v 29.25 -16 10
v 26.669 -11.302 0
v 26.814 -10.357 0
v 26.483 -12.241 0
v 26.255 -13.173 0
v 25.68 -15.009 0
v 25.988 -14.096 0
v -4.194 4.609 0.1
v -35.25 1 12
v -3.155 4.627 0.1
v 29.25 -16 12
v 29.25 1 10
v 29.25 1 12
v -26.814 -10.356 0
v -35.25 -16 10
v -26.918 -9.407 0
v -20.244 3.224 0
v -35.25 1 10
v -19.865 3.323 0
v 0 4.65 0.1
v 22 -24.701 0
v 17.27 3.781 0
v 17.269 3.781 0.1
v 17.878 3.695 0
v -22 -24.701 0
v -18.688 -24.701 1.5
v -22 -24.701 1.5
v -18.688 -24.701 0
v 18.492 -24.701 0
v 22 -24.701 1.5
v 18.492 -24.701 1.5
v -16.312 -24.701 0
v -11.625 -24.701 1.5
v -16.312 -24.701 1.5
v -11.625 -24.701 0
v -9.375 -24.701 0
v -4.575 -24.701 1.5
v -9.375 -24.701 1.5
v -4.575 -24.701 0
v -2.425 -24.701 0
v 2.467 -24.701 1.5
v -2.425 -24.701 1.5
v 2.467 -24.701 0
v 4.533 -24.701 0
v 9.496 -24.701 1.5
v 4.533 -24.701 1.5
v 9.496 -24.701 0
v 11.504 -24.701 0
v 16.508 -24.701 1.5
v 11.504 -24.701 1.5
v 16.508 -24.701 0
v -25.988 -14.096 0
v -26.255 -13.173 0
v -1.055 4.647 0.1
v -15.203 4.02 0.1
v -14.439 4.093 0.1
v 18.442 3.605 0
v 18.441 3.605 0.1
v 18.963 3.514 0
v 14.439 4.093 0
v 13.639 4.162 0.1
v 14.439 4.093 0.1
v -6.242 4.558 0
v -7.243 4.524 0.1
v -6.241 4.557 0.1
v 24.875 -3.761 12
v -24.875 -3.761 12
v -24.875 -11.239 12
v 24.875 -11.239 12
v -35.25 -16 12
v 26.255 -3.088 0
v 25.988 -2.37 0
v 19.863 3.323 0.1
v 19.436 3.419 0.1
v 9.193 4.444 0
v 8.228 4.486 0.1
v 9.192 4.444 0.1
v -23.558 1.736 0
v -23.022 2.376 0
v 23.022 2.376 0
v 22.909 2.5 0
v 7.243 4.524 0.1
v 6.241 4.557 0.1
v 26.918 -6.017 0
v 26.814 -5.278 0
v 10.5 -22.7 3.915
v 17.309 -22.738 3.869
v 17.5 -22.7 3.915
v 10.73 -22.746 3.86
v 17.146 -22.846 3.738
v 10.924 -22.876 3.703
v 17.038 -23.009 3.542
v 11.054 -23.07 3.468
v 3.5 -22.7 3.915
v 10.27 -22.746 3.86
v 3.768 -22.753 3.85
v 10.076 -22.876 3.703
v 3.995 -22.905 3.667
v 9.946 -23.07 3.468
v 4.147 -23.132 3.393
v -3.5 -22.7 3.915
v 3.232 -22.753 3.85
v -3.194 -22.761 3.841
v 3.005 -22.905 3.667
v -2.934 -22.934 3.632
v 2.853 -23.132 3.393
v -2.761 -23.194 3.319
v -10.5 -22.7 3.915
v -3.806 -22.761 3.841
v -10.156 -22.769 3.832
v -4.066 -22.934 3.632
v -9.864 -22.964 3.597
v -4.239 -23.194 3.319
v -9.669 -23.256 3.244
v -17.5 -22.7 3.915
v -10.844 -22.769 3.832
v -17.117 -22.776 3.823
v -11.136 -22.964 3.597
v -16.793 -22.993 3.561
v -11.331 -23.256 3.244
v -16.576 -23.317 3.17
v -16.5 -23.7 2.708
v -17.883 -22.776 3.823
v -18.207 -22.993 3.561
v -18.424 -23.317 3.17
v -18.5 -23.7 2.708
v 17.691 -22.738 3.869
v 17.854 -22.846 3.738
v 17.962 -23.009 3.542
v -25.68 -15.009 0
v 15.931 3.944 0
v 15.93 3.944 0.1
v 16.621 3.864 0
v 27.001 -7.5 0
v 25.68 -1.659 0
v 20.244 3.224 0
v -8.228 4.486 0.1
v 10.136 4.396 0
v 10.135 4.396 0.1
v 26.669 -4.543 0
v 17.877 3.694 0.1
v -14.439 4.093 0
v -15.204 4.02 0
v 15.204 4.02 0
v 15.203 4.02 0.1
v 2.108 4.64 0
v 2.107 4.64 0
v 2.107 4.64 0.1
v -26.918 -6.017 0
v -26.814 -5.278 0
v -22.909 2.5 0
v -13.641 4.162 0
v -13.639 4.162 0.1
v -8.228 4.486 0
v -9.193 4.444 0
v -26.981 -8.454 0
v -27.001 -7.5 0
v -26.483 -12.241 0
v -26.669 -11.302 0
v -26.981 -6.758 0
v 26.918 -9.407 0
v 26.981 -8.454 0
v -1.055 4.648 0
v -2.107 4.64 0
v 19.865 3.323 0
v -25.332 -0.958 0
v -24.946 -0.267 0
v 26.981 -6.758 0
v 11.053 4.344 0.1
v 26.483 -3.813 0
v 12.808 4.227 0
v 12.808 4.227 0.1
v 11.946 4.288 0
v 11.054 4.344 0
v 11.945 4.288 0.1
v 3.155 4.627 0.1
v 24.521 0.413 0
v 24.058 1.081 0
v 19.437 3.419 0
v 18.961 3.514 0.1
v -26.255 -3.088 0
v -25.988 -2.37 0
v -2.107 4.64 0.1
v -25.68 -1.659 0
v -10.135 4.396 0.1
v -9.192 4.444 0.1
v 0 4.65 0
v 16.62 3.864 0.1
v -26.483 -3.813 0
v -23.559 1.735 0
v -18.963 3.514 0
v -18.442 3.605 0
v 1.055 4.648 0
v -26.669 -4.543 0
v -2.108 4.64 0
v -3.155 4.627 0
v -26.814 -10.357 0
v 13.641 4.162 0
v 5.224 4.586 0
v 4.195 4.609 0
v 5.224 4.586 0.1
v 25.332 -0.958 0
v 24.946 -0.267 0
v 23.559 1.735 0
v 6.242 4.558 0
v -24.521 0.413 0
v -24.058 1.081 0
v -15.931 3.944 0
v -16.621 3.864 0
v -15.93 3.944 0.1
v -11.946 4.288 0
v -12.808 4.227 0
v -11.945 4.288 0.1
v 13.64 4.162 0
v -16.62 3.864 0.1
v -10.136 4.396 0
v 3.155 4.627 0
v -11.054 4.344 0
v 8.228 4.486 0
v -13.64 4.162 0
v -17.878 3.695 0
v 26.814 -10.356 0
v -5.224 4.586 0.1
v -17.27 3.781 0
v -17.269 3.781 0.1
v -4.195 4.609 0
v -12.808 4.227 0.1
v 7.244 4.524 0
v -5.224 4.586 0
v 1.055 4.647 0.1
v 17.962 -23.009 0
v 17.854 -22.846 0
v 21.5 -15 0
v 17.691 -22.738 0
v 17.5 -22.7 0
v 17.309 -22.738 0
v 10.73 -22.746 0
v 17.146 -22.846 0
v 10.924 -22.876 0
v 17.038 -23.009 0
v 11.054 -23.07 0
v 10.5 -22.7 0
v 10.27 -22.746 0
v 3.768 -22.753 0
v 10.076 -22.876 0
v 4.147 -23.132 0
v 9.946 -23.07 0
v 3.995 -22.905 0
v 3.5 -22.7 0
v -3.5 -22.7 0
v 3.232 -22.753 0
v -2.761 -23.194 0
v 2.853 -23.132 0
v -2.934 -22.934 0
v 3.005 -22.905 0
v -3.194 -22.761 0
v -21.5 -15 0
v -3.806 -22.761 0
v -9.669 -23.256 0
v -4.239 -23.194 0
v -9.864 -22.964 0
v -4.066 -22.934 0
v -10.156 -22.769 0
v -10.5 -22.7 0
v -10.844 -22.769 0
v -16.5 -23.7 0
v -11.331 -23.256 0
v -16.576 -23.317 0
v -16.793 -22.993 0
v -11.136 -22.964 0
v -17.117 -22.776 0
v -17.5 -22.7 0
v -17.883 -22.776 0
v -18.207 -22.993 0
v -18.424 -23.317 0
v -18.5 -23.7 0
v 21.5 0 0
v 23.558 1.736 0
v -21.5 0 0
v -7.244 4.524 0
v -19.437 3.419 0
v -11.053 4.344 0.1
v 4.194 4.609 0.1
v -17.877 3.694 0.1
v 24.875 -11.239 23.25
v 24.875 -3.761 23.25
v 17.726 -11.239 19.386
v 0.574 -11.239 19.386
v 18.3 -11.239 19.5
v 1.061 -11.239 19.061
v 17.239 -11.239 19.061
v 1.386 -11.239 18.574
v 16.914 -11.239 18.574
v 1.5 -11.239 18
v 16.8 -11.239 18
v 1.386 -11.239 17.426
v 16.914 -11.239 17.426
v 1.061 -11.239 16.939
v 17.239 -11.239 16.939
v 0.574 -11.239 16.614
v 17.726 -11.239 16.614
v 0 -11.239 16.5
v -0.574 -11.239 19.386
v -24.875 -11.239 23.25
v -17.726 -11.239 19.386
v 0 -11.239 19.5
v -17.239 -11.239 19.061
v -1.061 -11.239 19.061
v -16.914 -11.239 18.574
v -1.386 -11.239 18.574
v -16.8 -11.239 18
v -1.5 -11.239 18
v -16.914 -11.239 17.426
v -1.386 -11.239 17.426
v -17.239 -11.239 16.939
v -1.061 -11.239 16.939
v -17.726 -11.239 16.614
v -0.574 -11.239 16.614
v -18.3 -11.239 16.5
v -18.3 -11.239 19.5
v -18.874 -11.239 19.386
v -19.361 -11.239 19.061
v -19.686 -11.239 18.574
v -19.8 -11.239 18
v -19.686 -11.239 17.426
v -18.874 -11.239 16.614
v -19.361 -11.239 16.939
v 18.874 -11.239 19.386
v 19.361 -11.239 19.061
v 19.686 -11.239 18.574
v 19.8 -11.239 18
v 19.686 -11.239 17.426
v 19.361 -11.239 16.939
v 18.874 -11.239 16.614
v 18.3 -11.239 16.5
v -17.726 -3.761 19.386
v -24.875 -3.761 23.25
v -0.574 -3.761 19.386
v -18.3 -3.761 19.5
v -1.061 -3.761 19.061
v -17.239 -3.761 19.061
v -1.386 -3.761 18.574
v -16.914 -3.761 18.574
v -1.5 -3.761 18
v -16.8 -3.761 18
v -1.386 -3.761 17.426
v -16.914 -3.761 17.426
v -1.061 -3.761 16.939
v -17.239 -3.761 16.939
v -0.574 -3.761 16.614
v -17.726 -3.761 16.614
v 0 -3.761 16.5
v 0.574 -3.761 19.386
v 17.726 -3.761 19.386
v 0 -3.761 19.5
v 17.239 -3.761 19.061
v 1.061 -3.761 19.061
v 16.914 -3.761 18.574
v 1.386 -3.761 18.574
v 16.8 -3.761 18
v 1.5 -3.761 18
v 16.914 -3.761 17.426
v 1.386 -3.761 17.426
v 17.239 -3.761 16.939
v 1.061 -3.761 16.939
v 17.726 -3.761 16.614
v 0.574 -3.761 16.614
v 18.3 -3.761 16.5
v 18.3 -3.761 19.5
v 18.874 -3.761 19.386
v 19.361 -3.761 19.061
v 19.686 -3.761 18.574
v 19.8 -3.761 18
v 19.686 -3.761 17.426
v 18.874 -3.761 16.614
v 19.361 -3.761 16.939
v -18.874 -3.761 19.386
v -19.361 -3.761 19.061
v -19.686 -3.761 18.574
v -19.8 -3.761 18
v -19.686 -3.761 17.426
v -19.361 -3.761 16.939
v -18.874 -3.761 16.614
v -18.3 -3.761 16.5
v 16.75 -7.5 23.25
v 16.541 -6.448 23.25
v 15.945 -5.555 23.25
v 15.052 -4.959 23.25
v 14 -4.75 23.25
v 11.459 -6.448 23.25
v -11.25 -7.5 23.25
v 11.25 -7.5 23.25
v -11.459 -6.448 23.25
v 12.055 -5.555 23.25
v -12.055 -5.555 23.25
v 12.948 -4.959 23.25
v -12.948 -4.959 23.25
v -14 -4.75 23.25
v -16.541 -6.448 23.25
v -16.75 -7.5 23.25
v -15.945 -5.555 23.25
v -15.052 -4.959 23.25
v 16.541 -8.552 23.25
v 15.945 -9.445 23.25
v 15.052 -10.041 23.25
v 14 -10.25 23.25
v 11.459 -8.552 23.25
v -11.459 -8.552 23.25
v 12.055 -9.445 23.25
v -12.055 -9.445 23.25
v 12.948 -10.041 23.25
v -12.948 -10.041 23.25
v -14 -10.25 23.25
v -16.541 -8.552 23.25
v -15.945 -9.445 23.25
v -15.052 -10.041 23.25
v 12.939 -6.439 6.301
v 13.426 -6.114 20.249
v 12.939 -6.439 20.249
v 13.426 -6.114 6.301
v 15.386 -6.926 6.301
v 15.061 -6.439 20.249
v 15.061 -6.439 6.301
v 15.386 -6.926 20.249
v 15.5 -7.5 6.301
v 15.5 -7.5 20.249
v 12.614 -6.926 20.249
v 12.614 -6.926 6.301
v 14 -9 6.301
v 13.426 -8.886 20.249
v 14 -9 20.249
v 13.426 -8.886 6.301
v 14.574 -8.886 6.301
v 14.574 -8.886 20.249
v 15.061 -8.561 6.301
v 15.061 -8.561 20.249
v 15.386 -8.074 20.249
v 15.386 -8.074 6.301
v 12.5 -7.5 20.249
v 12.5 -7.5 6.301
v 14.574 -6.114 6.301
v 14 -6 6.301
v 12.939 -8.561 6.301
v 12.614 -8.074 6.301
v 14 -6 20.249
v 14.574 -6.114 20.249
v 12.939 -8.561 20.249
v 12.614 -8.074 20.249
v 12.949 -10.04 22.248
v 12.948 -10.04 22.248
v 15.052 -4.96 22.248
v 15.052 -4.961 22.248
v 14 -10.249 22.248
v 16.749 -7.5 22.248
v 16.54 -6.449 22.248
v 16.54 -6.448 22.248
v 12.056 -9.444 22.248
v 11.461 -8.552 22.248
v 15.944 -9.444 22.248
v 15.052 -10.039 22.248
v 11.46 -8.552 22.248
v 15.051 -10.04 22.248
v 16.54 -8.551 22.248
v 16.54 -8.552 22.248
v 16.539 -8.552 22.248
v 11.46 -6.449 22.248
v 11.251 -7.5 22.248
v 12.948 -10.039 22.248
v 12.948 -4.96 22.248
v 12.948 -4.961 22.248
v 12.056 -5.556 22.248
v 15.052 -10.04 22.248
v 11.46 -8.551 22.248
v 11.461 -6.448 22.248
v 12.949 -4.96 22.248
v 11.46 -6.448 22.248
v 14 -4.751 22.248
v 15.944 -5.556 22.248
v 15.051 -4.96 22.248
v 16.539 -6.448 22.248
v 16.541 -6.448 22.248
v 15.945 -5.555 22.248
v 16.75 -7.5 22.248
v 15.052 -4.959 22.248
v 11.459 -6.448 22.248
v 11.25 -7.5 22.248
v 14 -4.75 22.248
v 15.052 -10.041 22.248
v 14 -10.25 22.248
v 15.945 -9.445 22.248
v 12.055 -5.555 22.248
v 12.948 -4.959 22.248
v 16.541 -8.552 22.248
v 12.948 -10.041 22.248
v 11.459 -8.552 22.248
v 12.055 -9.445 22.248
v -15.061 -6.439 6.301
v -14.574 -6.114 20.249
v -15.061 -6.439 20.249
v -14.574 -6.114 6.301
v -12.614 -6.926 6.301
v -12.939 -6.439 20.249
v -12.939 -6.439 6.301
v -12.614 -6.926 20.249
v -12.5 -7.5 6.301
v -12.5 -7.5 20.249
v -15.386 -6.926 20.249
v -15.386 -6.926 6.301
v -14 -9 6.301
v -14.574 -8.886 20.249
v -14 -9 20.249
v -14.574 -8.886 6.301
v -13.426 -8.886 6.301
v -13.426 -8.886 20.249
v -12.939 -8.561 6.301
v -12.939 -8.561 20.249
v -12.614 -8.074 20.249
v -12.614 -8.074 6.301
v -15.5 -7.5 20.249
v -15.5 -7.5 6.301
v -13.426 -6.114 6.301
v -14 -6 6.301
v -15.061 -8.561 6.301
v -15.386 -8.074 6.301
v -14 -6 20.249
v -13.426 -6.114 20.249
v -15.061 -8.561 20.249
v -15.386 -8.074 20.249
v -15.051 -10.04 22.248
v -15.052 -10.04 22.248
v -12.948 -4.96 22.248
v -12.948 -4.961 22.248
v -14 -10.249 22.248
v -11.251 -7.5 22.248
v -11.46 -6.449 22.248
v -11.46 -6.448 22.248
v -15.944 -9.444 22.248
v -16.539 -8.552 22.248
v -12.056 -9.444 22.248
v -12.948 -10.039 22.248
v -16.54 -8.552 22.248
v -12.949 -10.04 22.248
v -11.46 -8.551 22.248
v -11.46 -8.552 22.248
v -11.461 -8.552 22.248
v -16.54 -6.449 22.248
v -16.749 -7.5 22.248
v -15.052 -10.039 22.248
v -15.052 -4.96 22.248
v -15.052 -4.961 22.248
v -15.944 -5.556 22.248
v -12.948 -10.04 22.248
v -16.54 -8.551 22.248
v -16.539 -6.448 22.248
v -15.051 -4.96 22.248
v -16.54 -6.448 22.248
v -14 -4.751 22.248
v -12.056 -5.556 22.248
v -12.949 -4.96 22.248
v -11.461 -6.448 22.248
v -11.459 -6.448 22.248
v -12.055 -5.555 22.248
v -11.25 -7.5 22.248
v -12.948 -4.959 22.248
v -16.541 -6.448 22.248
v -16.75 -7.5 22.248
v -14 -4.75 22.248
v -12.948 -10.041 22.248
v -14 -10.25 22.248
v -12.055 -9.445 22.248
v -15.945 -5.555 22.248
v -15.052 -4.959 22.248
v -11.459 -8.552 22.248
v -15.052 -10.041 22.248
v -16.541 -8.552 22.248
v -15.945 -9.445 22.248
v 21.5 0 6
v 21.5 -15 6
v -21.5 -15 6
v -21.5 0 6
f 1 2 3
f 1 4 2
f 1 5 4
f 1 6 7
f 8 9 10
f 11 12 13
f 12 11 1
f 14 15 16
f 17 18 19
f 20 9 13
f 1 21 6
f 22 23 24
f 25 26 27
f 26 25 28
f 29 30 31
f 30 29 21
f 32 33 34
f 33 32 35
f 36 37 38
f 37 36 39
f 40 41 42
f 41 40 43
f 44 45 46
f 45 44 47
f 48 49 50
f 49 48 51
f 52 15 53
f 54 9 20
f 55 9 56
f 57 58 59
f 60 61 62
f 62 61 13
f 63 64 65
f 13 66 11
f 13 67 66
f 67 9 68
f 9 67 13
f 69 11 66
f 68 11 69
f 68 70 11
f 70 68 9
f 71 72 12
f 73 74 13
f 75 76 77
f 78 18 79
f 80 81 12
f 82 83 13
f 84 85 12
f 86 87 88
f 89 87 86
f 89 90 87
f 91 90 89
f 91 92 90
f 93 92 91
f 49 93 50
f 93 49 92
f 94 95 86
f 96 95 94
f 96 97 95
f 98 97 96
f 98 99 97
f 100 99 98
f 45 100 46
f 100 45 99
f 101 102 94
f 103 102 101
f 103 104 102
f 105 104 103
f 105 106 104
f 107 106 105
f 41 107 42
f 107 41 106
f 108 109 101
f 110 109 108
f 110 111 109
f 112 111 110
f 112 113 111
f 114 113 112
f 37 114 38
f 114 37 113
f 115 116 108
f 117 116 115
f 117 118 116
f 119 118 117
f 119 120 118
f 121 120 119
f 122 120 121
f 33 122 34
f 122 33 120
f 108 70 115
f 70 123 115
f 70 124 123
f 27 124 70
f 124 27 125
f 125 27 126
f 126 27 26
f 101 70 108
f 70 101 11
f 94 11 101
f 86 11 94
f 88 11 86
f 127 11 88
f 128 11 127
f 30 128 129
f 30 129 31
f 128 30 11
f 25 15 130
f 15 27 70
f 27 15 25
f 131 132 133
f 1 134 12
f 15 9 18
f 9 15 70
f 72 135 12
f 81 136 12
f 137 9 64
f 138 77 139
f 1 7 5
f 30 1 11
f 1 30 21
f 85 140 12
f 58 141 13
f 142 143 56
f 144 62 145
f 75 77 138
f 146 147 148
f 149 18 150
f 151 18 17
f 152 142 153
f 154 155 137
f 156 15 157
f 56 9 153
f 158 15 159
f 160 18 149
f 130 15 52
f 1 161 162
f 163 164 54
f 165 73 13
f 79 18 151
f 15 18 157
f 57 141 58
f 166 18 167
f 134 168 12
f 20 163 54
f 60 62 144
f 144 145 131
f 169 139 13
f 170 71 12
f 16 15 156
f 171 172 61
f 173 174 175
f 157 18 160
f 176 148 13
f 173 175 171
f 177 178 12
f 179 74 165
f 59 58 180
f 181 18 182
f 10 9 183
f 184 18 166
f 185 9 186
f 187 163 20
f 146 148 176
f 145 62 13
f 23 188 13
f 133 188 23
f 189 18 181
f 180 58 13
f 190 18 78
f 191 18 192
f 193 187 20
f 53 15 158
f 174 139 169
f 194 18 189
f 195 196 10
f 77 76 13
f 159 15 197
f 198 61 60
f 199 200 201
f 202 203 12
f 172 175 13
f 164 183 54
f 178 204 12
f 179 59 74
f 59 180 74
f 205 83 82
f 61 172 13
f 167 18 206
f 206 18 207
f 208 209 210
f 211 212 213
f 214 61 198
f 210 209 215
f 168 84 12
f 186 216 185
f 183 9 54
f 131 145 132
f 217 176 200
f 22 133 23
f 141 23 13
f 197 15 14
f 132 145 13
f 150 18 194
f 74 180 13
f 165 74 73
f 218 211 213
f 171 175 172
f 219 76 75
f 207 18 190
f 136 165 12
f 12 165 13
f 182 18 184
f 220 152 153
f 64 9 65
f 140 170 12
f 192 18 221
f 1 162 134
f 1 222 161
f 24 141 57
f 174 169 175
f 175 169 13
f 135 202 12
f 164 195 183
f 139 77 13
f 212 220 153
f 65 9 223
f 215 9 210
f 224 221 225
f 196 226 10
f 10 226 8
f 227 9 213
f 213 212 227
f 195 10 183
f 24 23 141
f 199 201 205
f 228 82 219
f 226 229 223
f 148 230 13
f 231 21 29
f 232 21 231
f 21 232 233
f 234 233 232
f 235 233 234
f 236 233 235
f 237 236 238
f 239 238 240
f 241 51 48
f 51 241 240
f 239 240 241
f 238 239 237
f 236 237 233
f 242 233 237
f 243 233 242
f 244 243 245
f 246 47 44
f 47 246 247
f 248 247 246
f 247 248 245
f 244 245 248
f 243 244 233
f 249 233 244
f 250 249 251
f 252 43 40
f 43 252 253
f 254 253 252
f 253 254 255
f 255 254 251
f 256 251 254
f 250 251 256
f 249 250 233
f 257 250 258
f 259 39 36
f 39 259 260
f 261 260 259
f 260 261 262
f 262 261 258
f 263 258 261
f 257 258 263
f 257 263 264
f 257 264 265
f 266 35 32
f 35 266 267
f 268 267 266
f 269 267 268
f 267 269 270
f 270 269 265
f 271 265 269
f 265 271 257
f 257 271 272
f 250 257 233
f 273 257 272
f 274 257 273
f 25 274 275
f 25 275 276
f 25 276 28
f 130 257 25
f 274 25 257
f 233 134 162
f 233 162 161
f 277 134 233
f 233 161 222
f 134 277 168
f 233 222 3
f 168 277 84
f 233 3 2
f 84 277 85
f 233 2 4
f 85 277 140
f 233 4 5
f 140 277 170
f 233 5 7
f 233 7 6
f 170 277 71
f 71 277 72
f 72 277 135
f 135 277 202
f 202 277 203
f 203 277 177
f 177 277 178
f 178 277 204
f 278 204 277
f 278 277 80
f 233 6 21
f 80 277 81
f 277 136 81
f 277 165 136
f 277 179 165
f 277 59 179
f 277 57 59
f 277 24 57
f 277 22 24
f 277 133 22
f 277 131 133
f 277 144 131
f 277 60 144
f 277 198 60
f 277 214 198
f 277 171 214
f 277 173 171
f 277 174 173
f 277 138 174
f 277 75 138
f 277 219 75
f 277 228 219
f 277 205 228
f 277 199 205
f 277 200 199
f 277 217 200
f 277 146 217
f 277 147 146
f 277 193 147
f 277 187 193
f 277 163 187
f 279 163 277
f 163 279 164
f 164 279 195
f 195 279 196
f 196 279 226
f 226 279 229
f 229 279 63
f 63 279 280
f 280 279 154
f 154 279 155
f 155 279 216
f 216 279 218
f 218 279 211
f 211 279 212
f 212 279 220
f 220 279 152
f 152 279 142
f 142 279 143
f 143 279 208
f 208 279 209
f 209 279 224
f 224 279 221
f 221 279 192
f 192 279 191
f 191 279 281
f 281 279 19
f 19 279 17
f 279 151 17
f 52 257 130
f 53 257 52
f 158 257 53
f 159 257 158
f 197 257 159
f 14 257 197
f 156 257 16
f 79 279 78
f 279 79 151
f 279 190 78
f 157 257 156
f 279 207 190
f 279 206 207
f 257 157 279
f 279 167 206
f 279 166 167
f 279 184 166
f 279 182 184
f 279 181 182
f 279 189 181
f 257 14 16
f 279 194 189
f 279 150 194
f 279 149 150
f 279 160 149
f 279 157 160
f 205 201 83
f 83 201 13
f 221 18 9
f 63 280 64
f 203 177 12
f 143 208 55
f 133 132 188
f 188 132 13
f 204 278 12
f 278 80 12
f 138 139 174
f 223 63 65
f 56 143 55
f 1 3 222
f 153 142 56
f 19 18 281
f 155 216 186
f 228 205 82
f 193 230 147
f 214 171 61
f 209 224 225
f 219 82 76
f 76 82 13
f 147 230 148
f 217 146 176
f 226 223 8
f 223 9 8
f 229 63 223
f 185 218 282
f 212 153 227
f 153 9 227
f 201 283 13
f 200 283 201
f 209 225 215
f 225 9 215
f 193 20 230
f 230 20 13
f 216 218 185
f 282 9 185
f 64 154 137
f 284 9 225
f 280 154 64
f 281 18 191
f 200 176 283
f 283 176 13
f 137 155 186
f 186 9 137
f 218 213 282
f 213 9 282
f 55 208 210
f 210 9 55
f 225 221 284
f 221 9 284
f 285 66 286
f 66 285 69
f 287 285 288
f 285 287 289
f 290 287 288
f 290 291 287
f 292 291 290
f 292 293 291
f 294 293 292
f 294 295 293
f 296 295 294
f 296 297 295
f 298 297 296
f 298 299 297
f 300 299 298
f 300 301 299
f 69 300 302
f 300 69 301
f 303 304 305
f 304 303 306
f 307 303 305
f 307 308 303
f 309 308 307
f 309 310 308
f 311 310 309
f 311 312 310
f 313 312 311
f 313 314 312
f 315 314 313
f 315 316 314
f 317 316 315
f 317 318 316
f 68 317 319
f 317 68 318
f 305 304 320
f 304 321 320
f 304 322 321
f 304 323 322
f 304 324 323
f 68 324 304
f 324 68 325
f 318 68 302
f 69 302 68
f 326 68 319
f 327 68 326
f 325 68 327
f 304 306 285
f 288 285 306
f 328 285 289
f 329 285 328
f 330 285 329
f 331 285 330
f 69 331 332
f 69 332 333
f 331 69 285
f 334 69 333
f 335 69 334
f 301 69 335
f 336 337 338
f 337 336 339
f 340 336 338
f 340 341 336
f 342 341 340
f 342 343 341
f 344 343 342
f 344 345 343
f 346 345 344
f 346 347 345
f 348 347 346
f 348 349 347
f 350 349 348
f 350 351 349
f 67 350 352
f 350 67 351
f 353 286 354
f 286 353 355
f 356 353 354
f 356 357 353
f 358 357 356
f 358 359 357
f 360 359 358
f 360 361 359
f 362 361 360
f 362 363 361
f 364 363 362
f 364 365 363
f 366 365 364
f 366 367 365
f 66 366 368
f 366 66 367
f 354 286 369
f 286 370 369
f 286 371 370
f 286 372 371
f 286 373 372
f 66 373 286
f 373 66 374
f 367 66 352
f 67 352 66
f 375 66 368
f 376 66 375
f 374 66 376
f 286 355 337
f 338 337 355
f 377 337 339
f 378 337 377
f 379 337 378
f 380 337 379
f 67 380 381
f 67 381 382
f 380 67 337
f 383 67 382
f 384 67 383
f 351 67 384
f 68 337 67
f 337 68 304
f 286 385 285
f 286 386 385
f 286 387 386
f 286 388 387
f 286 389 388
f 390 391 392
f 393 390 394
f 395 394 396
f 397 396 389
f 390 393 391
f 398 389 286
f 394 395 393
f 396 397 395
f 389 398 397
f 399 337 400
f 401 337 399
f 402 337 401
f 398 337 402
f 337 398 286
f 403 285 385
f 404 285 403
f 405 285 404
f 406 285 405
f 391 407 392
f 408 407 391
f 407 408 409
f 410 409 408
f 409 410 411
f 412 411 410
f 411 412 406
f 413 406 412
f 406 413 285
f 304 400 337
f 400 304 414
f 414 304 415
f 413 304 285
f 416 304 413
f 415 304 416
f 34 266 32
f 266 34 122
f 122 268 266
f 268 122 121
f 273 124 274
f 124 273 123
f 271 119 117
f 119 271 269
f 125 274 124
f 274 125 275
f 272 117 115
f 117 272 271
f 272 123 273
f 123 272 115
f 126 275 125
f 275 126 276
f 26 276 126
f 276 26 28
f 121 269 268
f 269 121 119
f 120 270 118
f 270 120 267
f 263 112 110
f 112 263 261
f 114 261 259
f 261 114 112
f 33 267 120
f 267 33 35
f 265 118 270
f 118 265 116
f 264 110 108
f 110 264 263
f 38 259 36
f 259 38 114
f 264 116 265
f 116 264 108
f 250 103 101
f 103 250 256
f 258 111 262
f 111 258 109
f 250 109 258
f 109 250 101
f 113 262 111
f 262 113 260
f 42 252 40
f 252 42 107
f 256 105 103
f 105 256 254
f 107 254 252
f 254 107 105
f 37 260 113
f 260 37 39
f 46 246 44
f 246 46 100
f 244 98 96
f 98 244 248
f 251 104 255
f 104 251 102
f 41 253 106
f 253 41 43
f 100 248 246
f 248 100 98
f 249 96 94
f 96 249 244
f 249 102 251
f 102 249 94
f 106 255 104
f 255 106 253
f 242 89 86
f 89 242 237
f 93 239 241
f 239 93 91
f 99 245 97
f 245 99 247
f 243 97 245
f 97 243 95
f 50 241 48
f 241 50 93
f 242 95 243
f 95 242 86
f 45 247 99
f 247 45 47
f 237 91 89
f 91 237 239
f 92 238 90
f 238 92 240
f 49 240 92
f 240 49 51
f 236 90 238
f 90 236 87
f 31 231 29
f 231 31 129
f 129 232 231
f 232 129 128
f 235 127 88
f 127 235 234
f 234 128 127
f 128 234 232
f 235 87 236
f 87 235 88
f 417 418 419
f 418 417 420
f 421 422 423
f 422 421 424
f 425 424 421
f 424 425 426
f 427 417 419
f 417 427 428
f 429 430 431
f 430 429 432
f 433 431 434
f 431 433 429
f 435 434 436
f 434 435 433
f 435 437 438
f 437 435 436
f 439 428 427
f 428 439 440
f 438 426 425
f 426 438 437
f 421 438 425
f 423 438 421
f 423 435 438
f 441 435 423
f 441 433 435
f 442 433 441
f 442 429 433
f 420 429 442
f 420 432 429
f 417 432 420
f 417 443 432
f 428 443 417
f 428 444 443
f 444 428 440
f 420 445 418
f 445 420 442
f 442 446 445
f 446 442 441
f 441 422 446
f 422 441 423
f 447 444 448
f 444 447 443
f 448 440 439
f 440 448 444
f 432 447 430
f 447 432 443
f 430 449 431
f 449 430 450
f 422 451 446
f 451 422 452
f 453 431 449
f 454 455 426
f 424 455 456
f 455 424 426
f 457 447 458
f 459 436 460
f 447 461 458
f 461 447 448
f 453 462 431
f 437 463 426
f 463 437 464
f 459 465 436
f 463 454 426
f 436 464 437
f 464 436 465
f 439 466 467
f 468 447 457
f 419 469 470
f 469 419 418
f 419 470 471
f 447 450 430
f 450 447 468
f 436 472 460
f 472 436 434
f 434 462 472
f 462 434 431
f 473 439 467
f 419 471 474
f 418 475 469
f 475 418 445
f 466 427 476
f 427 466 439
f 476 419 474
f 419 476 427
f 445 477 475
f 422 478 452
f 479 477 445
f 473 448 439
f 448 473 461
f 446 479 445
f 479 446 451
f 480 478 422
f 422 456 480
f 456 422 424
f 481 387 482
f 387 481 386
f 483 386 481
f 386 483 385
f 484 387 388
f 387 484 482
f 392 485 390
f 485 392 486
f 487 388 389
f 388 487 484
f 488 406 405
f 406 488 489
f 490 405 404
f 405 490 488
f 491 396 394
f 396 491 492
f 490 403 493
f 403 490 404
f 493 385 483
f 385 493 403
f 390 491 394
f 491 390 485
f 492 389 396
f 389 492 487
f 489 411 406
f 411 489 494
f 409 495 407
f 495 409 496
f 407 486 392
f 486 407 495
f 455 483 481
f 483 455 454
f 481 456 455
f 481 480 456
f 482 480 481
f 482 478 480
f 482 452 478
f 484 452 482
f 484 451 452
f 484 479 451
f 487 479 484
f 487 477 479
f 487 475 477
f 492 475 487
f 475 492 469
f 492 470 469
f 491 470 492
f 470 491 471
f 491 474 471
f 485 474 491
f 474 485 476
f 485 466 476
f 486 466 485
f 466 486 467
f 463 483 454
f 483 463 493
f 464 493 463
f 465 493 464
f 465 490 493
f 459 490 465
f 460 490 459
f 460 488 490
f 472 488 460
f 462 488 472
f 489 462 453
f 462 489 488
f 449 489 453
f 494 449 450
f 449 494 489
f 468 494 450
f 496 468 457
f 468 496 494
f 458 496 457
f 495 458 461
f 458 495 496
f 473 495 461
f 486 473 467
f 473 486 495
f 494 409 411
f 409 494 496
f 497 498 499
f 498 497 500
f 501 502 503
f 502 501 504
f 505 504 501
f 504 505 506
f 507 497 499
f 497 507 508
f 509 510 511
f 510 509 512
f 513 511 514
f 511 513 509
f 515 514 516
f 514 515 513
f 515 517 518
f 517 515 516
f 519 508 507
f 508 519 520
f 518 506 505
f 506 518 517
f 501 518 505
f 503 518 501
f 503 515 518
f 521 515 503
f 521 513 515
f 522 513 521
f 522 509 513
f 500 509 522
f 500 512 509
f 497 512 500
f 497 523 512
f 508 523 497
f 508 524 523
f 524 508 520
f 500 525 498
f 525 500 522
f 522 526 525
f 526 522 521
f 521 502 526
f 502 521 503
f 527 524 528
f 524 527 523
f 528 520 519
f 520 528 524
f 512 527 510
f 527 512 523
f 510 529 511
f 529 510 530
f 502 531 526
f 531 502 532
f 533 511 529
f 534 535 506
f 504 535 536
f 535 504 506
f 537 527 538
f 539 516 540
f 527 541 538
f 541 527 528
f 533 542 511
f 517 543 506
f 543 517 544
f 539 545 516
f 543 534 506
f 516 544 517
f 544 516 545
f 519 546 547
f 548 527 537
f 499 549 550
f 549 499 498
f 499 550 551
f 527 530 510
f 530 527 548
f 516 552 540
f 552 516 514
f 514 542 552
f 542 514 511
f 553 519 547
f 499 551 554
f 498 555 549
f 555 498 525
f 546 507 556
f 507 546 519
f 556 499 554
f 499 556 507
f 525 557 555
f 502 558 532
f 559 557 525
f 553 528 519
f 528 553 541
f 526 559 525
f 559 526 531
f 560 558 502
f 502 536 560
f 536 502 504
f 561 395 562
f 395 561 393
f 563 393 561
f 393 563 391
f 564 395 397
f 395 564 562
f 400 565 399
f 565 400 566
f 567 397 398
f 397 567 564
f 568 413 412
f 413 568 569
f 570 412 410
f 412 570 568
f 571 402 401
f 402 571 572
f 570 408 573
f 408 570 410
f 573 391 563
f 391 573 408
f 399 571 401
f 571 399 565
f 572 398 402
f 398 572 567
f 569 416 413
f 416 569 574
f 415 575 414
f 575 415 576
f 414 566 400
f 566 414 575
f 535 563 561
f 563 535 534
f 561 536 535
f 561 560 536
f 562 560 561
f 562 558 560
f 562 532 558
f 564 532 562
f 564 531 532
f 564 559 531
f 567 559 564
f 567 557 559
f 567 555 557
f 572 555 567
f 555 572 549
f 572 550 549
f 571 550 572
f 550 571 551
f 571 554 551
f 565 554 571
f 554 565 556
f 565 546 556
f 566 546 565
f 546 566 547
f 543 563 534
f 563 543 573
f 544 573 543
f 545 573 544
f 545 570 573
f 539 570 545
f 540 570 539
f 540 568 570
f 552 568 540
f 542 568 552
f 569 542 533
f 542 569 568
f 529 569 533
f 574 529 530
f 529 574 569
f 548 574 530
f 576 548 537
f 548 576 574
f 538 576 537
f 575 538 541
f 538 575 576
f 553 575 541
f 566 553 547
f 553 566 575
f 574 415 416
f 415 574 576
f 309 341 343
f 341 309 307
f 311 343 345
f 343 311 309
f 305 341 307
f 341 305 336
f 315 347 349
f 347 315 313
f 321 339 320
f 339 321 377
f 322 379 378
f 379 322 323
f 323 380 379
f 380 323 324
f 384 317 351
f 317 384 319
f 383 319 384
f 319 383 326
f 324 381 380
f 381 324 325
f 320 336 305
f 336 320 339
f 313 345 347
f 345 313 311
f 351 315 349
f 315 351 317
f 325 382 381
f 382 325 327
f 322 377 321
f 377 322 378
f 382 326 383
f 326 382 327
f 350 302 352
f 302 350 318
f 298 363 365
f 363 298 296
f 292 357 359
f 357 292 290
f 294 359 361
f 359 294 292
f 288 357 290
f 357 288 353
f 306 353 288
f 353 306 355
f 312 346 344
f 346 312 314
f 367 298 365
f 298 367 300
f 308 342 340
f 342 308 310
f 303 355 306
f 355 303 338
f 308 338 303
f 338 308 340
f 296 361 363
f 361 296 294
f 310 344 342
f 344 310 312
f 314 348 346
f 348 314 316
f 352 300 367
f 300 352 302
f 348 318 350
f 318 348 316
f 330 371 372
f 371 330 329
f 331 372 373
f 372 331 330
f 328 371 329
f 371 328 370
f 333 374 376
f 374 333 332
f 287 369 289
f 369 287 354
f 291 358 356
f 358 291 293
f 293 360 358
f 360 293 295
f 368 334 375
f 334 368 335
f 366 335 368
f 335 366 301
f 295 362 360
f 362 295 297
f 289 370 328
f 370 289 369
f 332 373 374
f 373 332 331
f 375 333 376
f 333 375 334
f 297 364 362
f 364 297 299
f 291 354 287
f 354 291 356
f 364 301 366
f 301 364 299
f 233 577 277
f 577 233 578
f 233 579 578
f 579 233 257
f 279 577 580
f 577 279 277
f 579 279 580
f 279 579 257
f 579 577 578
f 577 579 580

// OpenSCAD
// file: ../screws.scad
module screwA(dia,z,hDia,hZ,rY){
    rotate([0,rY,0]){
    $fn=12;
    cylinder(d1=hDia,d2=dia,h=hZ);
    cylinder(d=dia,h=z);
    }
}
// file: ../skeleton/mkBeam.scad
module mkBeam(height){
    size=15;
    translate([0,0,-height/2])difference(){
        rcube([size,size,height],0.5);
        for(i=[0:3]){
            rotate([0,0,i*90])translate([size/2+3,0,0])cube([size,3,height*3],center=true);
        }
    }
}

//mkBeam(50);

module rcube(size,radius){
linear_extrude(height=size[2])
if(radius>0){
hull()
{
    // place 4 circles in the corners, with the given radius
    translate([(-size[0]/2)+(radius), (-size[1]/2)+(radius), 0])
    circle(r=radius);

    translate([(size[0]/2)-(radius), (-size[1]/2)+(radius), 0])
    circle(r=radius);

    translate([(-size[0]/2)+(radius), (size[1]/2)-(radius), 0])
    circle(r=radius);

    translate([(size[0]/2)-(radius), (size[1]/2)-(radius), 0])
    circle(r=radius);
}
}
if(radius==0){
translate([0,0,size[2]/2])cube(size,center=true);
}
}
// file: ../skeleton/slotBody.scad
include <mkBeam.scad>;
include <../parameter.scad>;
include <../screws.scad>;

//slotBody();

module slotBody(){
    hull(){
        translate([fretL(0)/2-slotXY/2,neckSlotY-0.05-slotXY*2,-slotXY/2])rotate([90,0,0])mkBeam(0.1);
        translate([fretL(neckSlotY-nut_slotSink)/2-slotXY/2,0.05-slotXY*2,-slotXY/2])rotate([90,0,0])mkBeam(0.1);
    }
    hull(){
        translate([-(fretL(0)/2-slotXY/2),neckSlotY-0.05-slotXY*2,-slotXY/2])rotate([90,0,0])mkBeam(0.1);
        translate([-(fretL(neckSlotY-nut_slotSink)/2-slotXY/2),0.05-slotXY*2,-slotXY/2])rotate([90,0,0])mkBeam(0.1);
    }
//translate([-slotXY/2-neckSlotDist/2,neckSlotY/2-slotXY*2,-slotXY/2])rotate([90,0,0])mkBeam(neckSlotY);
//translate([slotXY/2+neckSlotDist/2,neckSlotY/2-slotXY*2,-slotXY/2])rotate([90,0,0])mkBeam(neckSlotY);

translate([0,-slotXY/2,-slotXY/2-slotXY])rotate([0,90,0])mkBeam(bodySlotX);
translate([0,-slotXY/2-slotXY,-slotXY/2-slotXY])rotate([0,90,0])mkBeam(bodySlotX);

translate([0,-bodySlotY+slotXY/2,-slotXY/2-slotXY])rotate([0,90,0])mkBeam(bodySlotX);

translate([-bodySlotX/2+slotXY/2,-bodySlotY/2,-slotXY/2])rotate([90,0,0])mkBeam(bodySlotY);
translate([-(-bodySlotX/2+slotXY/2),-bodySlotY/2,-slotXY/2])rotate([90,0,0])mkBeam(bodySlotY);

}

module slotBd_spacer(){
difference(){
    x=bodySlotX-slotXY*2;
    y=fretPos(24)-fretPos(22)+neck_lastFretSpc+neck_mntEndT;//slotXY*2;//+neck_mntEndT;
    z=6.5;
    scrwD=5;
    sink=slotXY;
translate([-x/2,-y,-sink])cube([x,y,z]);
translate([-x/4,-y/2,-sink-1])cube([x/2,y,z+2]);

translate([x/2-scrwD,-slotXY/2,-sink+z+0.1])screwA(3.3,20,7,2.5,180);
translate([x/2-scrwD,-slotXY*1.5,-sink+z+0.1])screwA(3.3,20,7,2.5,180);
    
translate([-(x/2-scrwD),-slotXY/2,-sink+z+0.1])screwA(3.3,20,7,2.5,180);
translate([-(x/2-scrwD),-slotXY*1.5,-sink+z+0.1])screwA(3.3,20,7,2.5,180);

translate([0,0,-1])slotBody();

}
}
    
//slotBd_spacer();
// file: ../parameter.scad
nStrings=6;
nFrets=24;
nLedFrets=16;
m5Dia=5.3;
m5HeadZ=3.5;
m4Dia=4.3;
m4NutDia=8.3;
m4NutZ=3.5;
m4HeadZ=2.5;
m3Dia=3.3;
m3NutDia=6.6;
m3NutZ=2.5;
m3HeadZ=2;
m3HeadDia=6;
m2Dia=2.4;
m2HeadZ=2;
strDistN=7;
strDistB=10.5;
scale=645;
neckSlotY=500;

slotXY=15;

bodySlotX=115;
bodySlotY=250;

jackYA=40;
jackYB=54;
jackZA=20;
jackZB=25;

bodyX=300;

bodyZ=40;

strDia=[1.7,1.4,1.1,0.7,0.5,0.35];

fretStrPlus=4;
fretLN=strDistN*(nStrings-1)+fretStrPlus*2;
fretLB=strDistB*(nStrings-1)+fretStrPlus*2;
strSpanB=strDistB*(nStrings-1);
strSpanN=strDistN*(nStrings-1);
fretBtmZ=1;
neckSlotX=fretLN;
neckSlotDist=neckSlotX-slotXY*2;

neck_sideT=5.5; //thicknes of the neck side locks
neck_bottomT=2.5;

neck_mntPosYA=447;
neck_mntPosYB=420;
neck_mntEndT=2.5;
neck_lastFretSpc=13;

nut_slotSink=6;

//fretY=16;
fretPcbZ=1.6;
fretDia=3.5;
fretZ=1.5;
fretOvrZ=4;
fretboardZ=fretOvrZ+fretPcbZ;



L=scale;
k=1.05946;

fretPos1=scale-(scale/pow(k,4));

function fretPos(i)=L-(L/pow(k,i));
function fretSpc(i)=(L/pow(k,i))-(L/pow(k,i+1));
function strSpc(i)=i/L*strDistB+(1-i/L)*strDistN;
function fretL(i)=(i/L*strDistB+(1-i/L)*strDistN)*(nStrings-1)+fretStrPlus*2;

echo (70-(fretL(fretPos(1))));
// main file
include <../parameter.scad>;
include <../neck/neck.scad>;

zA=17;

xB=45;
xN=strSpanN+9;
y=90;
edgeDia=10;

tunShftDia=5.5;
xA=strSpanN+tunShftDia+fretStrPlus+6;
tunerX=20;


tunerDia=10.4; //(8.6)


tunerYDistA=30;
tunerYDistB=30;

tunerYOff=16.1;

angle=10;

scrwDia=3.3;
scrwDist=fretLN-slotXY;
slotSink=8;

strsink=1;


mountT=10; //mount thickness

strHDia=[2,1.8,1.6,1.4,1.2,1];
strSp=1.5;
strEtoE=(nStrings-1)*strDistN;
fret2Str=0.6; //distance between Strings and frets on the nut position

nutZA=fretboardZ+fretZ+strHDia[5];
nutZB=6;
nutY=12;
nutZ=nutZA+nutZB;

strZPos=fretboardZ+fret2Str+fretZ+strsink;

lockZ=zA/2.2;
lockY=12;
lockX=xA;
lockScr=3;
lockNut=6.3;
lockNutZ=2.5;
lockHeadD=5.5;
lockHeadZ=2;
lockScrSpc=scrwDist/2+scrwDia+1;

xAngle=12;

printSp=0.3;

//head();
//scrw(lockScr,10);
//strSpacer();
rotate([90,0,0])nut();
//translate([0,nutY,0])rotate([xAngle,0,0])tuners();

module scrw(dia, h){
$fn=16;
headD=lockHeadD;
headZ=lockHeadZ;
translate([0,0,-h-headZ+0.001])cylinder(d=dia,h=h);
translate([0,0,-headZ-0.001])cylinder(d1=dia,d2=headD,h=headZ+0.001);
translate([0,0,-0.002])cylinder(d=headD,h=20);
}

module head(){
translate([0,nutY,-slotXY])tuners();
translate([0,0,-slotXY])rotate([0,0,0])nut();
}

module tuners(){

tYDist=23;
zAngle=19.7;

y=tYDist*5+17;
tunerYOff=9;
t=0.3;


translate([0,0,(slotXY-zA)/2])rotate([-xAngle,0,0])translate([0,tunerX/2,0])difference(){
union(){
hull(){
translate([-(xA+tunerX)/2,-tunerX/2,0])cube([xA+tunerX-6,0.1,zA]);
translate([-(xA+tunerX)/2,-tunerX/2,0])rotate([xAngle,0,0])cube([xA+tunerX-6,0.1,zA]);
}

hull(){
translate([-(xA+tunerX)/2,-tunerX/2,0])cube([xA+tunerX-6,1,zA]);
translate([xA/2,0,0]){

//cylinder(d=tunerX,h=zA);
//rotate([0,0,0])translate([-4,y-8,0])cylinder(d=tunerX,h=zA);
}
translate([-xA/2,0,0]){
cylinder(d=tunerX,h=zA);
rotate([0,0,-zAngle])translate([0,y,0])cylinder(d=tunerX,h=zA);
}
}
}
for(i=[0:5]){
translate([-xA/2,0,0])rotate([0,0,-zAngle])tuner(0,i*tYDist+tunerYOff,0);}

zOff=-2;
//translate([0,-tunerX/2,0])rotate([xAngle,0,0])translate([scrwDist/2,0,zA/2])rotate([-90,0,0])cylinder(d=scrwDia,h=y,$fn=16);
//translate([0,-tunerX/2,0])rotate([xAngle,0,0])translate([-scrwDist/2,0,zA/2])rotate([-90,0,0])cylinder(d=scrwDia,h=y,$fn=16);

//translate([0,-tunerX/2,0])rotate([xAngle,0,0])translate([-(scrwDist+scrwDia)/2,mountT,-zA])rotate([0,0,0])cube([scrwDist+scrwDia,10,zA*2]);
translate([-lockX/2-t,-tunerX/2,0])rotate([xAngle,0,0])translate([0,-1,(zA-lockZ)/2])cube([lockX+t*2,lockY+1.5,lockZ]);


for(i=[0:2]){
space=lockScrSpc;
translate([i*space-space,-tunerX/2,0])rotate([xAngle,0,0])translate([0,lockY/2,m4NutZ+zOff+printSp])cylinder(d=lockScr,h=zA-m4HeadZ-4,$fn=16);
//translate([i*space-space,-tunerX/2,0])rotate([xAngle,0,0])translate([0,lockY/2,zA+zOff-2.2])cylinder(d=lockScr,h=zA-m4HeadZ-4,$fn=16);
translate([i*space-space,-tunerX/2,0])rotate([xAngle,0,0])translate([0,lockY/2,zA-1])rotate([0,0,0])scrw(lockScr,(zA-lockZ)/2-lockHeadZ-1-printSp);
translate([i*space-space,-tunerX/2,0])rotate([xAngle,0,0])translate([0,lockY/2,zOff])cylinder(d=lockNut,h=lockNutZ,$fn=6);
}


}

module tuner(posX,posY,rot){
$fn=32;
slotDia=3.3;
slotToC=8.5;
slotDist=10;
slotZ=5;
translate([posX,posY,0]){
translate([0,0,-1])cylinder(d=tunerDia,h=zA+2);
translate([slotDist/2,slotToC,-1])cylinder(d=slotDia,h=slotZ+1);
translate([-slotDist/2,slotToC,-1])cylinder(d=slotDia,h=slotZ+1);
}
}

}



module nut(){
spacing=strDistN;
t=0.75;
translate([0,nutY,0]){
difference(){
union(){
hull(){
translate([0,-nutY,0])rotate([180,0,0])neckShp();
translate([-(xA+tunerX)/2,0-2,(slotXY-zA)/2])cube([xA+tunerX-6,2,zA]);
translate([-xN/2,-nutY,slotXY+strZPos+strHDia[0]/2])cube([xN,strSp,0.001]);
}
lockX=lockX-t;
lockZ=lockZ-0.25;
translate([-lockX/2,0,(slotXY-zA)/2+(zA-lockZ)/2])cube([lockX,lockY-t,lockZ]);
}

translate([-(scrwDist+slotXY)/2,-nutY-1,0])cube([scrwDist+slotXY,nut_slotSink+1,slotXY]);

for(i=[0:nStrings-1]){
translate([i*spacing,0,0]){
hull(){
translate([-(spacing*(nStrings-1))/2,0,slotXY+strZPos+strHDia[i]/2-strsink])rotate([90,0,0])cylinder(d=strHDia[i],h=20,$fn=16);
translate([-(spacing*(nStrings-1))/2,0,slotXY+strZPos+strHDia[i]*2])rotate([90,0,0])cylinder(d=strHDia[i]+1.5,h=20,$fn=16);
}
}}

translate([scrwDist/2,lockY-1-t,slotXY/2])rotate([-90,0,0])scrw(lockScr,lockY+nutY/2-3-printSp-t);
translate([-scrwDist/2,lockY-1-t,slotXY/2])rotate([-90,0,0])scrw(lockScr,lockY+nutY/2-3-printSp-t);


for(i=[0:2]){
space=lockScrSpc;
translate([i*space-space,lockY/2,0])rotate([0,0,0])cylinder(d=lockScr,h=y/3,$fn=16);
translate([i*space-space,lockY/2,0])rotate([0,0,0])cylinder(d=lockScr,h=y/3,$fn=16);
translate([i*space-space,lockY/2,0])rotate([0,0,0])cylinder(d=lockScr,h=y/3,$fn=16);
}
}
}
}

module strSpacer(){
spacing=strDistN;
rotate([90,0,0]){
difference(){
translate([-(strEtoE+8)/2,0,0])cube([strEtoE+8,3,10]);
for(i=[0:strings-1]){
translate([i*spacing,0,0]){
hull(){
translate([-(spacing*(nStrings-1))/2,0,0])rotate([-90,0,0])cylinder(d=1.5,h=20,$fn=16);
translate([-(spacing*(nStrings-1))/2,0,5])rotate([-90,0,0])cylinder(d=1.5,h=20,$fn=16);}}}
}
}
}
